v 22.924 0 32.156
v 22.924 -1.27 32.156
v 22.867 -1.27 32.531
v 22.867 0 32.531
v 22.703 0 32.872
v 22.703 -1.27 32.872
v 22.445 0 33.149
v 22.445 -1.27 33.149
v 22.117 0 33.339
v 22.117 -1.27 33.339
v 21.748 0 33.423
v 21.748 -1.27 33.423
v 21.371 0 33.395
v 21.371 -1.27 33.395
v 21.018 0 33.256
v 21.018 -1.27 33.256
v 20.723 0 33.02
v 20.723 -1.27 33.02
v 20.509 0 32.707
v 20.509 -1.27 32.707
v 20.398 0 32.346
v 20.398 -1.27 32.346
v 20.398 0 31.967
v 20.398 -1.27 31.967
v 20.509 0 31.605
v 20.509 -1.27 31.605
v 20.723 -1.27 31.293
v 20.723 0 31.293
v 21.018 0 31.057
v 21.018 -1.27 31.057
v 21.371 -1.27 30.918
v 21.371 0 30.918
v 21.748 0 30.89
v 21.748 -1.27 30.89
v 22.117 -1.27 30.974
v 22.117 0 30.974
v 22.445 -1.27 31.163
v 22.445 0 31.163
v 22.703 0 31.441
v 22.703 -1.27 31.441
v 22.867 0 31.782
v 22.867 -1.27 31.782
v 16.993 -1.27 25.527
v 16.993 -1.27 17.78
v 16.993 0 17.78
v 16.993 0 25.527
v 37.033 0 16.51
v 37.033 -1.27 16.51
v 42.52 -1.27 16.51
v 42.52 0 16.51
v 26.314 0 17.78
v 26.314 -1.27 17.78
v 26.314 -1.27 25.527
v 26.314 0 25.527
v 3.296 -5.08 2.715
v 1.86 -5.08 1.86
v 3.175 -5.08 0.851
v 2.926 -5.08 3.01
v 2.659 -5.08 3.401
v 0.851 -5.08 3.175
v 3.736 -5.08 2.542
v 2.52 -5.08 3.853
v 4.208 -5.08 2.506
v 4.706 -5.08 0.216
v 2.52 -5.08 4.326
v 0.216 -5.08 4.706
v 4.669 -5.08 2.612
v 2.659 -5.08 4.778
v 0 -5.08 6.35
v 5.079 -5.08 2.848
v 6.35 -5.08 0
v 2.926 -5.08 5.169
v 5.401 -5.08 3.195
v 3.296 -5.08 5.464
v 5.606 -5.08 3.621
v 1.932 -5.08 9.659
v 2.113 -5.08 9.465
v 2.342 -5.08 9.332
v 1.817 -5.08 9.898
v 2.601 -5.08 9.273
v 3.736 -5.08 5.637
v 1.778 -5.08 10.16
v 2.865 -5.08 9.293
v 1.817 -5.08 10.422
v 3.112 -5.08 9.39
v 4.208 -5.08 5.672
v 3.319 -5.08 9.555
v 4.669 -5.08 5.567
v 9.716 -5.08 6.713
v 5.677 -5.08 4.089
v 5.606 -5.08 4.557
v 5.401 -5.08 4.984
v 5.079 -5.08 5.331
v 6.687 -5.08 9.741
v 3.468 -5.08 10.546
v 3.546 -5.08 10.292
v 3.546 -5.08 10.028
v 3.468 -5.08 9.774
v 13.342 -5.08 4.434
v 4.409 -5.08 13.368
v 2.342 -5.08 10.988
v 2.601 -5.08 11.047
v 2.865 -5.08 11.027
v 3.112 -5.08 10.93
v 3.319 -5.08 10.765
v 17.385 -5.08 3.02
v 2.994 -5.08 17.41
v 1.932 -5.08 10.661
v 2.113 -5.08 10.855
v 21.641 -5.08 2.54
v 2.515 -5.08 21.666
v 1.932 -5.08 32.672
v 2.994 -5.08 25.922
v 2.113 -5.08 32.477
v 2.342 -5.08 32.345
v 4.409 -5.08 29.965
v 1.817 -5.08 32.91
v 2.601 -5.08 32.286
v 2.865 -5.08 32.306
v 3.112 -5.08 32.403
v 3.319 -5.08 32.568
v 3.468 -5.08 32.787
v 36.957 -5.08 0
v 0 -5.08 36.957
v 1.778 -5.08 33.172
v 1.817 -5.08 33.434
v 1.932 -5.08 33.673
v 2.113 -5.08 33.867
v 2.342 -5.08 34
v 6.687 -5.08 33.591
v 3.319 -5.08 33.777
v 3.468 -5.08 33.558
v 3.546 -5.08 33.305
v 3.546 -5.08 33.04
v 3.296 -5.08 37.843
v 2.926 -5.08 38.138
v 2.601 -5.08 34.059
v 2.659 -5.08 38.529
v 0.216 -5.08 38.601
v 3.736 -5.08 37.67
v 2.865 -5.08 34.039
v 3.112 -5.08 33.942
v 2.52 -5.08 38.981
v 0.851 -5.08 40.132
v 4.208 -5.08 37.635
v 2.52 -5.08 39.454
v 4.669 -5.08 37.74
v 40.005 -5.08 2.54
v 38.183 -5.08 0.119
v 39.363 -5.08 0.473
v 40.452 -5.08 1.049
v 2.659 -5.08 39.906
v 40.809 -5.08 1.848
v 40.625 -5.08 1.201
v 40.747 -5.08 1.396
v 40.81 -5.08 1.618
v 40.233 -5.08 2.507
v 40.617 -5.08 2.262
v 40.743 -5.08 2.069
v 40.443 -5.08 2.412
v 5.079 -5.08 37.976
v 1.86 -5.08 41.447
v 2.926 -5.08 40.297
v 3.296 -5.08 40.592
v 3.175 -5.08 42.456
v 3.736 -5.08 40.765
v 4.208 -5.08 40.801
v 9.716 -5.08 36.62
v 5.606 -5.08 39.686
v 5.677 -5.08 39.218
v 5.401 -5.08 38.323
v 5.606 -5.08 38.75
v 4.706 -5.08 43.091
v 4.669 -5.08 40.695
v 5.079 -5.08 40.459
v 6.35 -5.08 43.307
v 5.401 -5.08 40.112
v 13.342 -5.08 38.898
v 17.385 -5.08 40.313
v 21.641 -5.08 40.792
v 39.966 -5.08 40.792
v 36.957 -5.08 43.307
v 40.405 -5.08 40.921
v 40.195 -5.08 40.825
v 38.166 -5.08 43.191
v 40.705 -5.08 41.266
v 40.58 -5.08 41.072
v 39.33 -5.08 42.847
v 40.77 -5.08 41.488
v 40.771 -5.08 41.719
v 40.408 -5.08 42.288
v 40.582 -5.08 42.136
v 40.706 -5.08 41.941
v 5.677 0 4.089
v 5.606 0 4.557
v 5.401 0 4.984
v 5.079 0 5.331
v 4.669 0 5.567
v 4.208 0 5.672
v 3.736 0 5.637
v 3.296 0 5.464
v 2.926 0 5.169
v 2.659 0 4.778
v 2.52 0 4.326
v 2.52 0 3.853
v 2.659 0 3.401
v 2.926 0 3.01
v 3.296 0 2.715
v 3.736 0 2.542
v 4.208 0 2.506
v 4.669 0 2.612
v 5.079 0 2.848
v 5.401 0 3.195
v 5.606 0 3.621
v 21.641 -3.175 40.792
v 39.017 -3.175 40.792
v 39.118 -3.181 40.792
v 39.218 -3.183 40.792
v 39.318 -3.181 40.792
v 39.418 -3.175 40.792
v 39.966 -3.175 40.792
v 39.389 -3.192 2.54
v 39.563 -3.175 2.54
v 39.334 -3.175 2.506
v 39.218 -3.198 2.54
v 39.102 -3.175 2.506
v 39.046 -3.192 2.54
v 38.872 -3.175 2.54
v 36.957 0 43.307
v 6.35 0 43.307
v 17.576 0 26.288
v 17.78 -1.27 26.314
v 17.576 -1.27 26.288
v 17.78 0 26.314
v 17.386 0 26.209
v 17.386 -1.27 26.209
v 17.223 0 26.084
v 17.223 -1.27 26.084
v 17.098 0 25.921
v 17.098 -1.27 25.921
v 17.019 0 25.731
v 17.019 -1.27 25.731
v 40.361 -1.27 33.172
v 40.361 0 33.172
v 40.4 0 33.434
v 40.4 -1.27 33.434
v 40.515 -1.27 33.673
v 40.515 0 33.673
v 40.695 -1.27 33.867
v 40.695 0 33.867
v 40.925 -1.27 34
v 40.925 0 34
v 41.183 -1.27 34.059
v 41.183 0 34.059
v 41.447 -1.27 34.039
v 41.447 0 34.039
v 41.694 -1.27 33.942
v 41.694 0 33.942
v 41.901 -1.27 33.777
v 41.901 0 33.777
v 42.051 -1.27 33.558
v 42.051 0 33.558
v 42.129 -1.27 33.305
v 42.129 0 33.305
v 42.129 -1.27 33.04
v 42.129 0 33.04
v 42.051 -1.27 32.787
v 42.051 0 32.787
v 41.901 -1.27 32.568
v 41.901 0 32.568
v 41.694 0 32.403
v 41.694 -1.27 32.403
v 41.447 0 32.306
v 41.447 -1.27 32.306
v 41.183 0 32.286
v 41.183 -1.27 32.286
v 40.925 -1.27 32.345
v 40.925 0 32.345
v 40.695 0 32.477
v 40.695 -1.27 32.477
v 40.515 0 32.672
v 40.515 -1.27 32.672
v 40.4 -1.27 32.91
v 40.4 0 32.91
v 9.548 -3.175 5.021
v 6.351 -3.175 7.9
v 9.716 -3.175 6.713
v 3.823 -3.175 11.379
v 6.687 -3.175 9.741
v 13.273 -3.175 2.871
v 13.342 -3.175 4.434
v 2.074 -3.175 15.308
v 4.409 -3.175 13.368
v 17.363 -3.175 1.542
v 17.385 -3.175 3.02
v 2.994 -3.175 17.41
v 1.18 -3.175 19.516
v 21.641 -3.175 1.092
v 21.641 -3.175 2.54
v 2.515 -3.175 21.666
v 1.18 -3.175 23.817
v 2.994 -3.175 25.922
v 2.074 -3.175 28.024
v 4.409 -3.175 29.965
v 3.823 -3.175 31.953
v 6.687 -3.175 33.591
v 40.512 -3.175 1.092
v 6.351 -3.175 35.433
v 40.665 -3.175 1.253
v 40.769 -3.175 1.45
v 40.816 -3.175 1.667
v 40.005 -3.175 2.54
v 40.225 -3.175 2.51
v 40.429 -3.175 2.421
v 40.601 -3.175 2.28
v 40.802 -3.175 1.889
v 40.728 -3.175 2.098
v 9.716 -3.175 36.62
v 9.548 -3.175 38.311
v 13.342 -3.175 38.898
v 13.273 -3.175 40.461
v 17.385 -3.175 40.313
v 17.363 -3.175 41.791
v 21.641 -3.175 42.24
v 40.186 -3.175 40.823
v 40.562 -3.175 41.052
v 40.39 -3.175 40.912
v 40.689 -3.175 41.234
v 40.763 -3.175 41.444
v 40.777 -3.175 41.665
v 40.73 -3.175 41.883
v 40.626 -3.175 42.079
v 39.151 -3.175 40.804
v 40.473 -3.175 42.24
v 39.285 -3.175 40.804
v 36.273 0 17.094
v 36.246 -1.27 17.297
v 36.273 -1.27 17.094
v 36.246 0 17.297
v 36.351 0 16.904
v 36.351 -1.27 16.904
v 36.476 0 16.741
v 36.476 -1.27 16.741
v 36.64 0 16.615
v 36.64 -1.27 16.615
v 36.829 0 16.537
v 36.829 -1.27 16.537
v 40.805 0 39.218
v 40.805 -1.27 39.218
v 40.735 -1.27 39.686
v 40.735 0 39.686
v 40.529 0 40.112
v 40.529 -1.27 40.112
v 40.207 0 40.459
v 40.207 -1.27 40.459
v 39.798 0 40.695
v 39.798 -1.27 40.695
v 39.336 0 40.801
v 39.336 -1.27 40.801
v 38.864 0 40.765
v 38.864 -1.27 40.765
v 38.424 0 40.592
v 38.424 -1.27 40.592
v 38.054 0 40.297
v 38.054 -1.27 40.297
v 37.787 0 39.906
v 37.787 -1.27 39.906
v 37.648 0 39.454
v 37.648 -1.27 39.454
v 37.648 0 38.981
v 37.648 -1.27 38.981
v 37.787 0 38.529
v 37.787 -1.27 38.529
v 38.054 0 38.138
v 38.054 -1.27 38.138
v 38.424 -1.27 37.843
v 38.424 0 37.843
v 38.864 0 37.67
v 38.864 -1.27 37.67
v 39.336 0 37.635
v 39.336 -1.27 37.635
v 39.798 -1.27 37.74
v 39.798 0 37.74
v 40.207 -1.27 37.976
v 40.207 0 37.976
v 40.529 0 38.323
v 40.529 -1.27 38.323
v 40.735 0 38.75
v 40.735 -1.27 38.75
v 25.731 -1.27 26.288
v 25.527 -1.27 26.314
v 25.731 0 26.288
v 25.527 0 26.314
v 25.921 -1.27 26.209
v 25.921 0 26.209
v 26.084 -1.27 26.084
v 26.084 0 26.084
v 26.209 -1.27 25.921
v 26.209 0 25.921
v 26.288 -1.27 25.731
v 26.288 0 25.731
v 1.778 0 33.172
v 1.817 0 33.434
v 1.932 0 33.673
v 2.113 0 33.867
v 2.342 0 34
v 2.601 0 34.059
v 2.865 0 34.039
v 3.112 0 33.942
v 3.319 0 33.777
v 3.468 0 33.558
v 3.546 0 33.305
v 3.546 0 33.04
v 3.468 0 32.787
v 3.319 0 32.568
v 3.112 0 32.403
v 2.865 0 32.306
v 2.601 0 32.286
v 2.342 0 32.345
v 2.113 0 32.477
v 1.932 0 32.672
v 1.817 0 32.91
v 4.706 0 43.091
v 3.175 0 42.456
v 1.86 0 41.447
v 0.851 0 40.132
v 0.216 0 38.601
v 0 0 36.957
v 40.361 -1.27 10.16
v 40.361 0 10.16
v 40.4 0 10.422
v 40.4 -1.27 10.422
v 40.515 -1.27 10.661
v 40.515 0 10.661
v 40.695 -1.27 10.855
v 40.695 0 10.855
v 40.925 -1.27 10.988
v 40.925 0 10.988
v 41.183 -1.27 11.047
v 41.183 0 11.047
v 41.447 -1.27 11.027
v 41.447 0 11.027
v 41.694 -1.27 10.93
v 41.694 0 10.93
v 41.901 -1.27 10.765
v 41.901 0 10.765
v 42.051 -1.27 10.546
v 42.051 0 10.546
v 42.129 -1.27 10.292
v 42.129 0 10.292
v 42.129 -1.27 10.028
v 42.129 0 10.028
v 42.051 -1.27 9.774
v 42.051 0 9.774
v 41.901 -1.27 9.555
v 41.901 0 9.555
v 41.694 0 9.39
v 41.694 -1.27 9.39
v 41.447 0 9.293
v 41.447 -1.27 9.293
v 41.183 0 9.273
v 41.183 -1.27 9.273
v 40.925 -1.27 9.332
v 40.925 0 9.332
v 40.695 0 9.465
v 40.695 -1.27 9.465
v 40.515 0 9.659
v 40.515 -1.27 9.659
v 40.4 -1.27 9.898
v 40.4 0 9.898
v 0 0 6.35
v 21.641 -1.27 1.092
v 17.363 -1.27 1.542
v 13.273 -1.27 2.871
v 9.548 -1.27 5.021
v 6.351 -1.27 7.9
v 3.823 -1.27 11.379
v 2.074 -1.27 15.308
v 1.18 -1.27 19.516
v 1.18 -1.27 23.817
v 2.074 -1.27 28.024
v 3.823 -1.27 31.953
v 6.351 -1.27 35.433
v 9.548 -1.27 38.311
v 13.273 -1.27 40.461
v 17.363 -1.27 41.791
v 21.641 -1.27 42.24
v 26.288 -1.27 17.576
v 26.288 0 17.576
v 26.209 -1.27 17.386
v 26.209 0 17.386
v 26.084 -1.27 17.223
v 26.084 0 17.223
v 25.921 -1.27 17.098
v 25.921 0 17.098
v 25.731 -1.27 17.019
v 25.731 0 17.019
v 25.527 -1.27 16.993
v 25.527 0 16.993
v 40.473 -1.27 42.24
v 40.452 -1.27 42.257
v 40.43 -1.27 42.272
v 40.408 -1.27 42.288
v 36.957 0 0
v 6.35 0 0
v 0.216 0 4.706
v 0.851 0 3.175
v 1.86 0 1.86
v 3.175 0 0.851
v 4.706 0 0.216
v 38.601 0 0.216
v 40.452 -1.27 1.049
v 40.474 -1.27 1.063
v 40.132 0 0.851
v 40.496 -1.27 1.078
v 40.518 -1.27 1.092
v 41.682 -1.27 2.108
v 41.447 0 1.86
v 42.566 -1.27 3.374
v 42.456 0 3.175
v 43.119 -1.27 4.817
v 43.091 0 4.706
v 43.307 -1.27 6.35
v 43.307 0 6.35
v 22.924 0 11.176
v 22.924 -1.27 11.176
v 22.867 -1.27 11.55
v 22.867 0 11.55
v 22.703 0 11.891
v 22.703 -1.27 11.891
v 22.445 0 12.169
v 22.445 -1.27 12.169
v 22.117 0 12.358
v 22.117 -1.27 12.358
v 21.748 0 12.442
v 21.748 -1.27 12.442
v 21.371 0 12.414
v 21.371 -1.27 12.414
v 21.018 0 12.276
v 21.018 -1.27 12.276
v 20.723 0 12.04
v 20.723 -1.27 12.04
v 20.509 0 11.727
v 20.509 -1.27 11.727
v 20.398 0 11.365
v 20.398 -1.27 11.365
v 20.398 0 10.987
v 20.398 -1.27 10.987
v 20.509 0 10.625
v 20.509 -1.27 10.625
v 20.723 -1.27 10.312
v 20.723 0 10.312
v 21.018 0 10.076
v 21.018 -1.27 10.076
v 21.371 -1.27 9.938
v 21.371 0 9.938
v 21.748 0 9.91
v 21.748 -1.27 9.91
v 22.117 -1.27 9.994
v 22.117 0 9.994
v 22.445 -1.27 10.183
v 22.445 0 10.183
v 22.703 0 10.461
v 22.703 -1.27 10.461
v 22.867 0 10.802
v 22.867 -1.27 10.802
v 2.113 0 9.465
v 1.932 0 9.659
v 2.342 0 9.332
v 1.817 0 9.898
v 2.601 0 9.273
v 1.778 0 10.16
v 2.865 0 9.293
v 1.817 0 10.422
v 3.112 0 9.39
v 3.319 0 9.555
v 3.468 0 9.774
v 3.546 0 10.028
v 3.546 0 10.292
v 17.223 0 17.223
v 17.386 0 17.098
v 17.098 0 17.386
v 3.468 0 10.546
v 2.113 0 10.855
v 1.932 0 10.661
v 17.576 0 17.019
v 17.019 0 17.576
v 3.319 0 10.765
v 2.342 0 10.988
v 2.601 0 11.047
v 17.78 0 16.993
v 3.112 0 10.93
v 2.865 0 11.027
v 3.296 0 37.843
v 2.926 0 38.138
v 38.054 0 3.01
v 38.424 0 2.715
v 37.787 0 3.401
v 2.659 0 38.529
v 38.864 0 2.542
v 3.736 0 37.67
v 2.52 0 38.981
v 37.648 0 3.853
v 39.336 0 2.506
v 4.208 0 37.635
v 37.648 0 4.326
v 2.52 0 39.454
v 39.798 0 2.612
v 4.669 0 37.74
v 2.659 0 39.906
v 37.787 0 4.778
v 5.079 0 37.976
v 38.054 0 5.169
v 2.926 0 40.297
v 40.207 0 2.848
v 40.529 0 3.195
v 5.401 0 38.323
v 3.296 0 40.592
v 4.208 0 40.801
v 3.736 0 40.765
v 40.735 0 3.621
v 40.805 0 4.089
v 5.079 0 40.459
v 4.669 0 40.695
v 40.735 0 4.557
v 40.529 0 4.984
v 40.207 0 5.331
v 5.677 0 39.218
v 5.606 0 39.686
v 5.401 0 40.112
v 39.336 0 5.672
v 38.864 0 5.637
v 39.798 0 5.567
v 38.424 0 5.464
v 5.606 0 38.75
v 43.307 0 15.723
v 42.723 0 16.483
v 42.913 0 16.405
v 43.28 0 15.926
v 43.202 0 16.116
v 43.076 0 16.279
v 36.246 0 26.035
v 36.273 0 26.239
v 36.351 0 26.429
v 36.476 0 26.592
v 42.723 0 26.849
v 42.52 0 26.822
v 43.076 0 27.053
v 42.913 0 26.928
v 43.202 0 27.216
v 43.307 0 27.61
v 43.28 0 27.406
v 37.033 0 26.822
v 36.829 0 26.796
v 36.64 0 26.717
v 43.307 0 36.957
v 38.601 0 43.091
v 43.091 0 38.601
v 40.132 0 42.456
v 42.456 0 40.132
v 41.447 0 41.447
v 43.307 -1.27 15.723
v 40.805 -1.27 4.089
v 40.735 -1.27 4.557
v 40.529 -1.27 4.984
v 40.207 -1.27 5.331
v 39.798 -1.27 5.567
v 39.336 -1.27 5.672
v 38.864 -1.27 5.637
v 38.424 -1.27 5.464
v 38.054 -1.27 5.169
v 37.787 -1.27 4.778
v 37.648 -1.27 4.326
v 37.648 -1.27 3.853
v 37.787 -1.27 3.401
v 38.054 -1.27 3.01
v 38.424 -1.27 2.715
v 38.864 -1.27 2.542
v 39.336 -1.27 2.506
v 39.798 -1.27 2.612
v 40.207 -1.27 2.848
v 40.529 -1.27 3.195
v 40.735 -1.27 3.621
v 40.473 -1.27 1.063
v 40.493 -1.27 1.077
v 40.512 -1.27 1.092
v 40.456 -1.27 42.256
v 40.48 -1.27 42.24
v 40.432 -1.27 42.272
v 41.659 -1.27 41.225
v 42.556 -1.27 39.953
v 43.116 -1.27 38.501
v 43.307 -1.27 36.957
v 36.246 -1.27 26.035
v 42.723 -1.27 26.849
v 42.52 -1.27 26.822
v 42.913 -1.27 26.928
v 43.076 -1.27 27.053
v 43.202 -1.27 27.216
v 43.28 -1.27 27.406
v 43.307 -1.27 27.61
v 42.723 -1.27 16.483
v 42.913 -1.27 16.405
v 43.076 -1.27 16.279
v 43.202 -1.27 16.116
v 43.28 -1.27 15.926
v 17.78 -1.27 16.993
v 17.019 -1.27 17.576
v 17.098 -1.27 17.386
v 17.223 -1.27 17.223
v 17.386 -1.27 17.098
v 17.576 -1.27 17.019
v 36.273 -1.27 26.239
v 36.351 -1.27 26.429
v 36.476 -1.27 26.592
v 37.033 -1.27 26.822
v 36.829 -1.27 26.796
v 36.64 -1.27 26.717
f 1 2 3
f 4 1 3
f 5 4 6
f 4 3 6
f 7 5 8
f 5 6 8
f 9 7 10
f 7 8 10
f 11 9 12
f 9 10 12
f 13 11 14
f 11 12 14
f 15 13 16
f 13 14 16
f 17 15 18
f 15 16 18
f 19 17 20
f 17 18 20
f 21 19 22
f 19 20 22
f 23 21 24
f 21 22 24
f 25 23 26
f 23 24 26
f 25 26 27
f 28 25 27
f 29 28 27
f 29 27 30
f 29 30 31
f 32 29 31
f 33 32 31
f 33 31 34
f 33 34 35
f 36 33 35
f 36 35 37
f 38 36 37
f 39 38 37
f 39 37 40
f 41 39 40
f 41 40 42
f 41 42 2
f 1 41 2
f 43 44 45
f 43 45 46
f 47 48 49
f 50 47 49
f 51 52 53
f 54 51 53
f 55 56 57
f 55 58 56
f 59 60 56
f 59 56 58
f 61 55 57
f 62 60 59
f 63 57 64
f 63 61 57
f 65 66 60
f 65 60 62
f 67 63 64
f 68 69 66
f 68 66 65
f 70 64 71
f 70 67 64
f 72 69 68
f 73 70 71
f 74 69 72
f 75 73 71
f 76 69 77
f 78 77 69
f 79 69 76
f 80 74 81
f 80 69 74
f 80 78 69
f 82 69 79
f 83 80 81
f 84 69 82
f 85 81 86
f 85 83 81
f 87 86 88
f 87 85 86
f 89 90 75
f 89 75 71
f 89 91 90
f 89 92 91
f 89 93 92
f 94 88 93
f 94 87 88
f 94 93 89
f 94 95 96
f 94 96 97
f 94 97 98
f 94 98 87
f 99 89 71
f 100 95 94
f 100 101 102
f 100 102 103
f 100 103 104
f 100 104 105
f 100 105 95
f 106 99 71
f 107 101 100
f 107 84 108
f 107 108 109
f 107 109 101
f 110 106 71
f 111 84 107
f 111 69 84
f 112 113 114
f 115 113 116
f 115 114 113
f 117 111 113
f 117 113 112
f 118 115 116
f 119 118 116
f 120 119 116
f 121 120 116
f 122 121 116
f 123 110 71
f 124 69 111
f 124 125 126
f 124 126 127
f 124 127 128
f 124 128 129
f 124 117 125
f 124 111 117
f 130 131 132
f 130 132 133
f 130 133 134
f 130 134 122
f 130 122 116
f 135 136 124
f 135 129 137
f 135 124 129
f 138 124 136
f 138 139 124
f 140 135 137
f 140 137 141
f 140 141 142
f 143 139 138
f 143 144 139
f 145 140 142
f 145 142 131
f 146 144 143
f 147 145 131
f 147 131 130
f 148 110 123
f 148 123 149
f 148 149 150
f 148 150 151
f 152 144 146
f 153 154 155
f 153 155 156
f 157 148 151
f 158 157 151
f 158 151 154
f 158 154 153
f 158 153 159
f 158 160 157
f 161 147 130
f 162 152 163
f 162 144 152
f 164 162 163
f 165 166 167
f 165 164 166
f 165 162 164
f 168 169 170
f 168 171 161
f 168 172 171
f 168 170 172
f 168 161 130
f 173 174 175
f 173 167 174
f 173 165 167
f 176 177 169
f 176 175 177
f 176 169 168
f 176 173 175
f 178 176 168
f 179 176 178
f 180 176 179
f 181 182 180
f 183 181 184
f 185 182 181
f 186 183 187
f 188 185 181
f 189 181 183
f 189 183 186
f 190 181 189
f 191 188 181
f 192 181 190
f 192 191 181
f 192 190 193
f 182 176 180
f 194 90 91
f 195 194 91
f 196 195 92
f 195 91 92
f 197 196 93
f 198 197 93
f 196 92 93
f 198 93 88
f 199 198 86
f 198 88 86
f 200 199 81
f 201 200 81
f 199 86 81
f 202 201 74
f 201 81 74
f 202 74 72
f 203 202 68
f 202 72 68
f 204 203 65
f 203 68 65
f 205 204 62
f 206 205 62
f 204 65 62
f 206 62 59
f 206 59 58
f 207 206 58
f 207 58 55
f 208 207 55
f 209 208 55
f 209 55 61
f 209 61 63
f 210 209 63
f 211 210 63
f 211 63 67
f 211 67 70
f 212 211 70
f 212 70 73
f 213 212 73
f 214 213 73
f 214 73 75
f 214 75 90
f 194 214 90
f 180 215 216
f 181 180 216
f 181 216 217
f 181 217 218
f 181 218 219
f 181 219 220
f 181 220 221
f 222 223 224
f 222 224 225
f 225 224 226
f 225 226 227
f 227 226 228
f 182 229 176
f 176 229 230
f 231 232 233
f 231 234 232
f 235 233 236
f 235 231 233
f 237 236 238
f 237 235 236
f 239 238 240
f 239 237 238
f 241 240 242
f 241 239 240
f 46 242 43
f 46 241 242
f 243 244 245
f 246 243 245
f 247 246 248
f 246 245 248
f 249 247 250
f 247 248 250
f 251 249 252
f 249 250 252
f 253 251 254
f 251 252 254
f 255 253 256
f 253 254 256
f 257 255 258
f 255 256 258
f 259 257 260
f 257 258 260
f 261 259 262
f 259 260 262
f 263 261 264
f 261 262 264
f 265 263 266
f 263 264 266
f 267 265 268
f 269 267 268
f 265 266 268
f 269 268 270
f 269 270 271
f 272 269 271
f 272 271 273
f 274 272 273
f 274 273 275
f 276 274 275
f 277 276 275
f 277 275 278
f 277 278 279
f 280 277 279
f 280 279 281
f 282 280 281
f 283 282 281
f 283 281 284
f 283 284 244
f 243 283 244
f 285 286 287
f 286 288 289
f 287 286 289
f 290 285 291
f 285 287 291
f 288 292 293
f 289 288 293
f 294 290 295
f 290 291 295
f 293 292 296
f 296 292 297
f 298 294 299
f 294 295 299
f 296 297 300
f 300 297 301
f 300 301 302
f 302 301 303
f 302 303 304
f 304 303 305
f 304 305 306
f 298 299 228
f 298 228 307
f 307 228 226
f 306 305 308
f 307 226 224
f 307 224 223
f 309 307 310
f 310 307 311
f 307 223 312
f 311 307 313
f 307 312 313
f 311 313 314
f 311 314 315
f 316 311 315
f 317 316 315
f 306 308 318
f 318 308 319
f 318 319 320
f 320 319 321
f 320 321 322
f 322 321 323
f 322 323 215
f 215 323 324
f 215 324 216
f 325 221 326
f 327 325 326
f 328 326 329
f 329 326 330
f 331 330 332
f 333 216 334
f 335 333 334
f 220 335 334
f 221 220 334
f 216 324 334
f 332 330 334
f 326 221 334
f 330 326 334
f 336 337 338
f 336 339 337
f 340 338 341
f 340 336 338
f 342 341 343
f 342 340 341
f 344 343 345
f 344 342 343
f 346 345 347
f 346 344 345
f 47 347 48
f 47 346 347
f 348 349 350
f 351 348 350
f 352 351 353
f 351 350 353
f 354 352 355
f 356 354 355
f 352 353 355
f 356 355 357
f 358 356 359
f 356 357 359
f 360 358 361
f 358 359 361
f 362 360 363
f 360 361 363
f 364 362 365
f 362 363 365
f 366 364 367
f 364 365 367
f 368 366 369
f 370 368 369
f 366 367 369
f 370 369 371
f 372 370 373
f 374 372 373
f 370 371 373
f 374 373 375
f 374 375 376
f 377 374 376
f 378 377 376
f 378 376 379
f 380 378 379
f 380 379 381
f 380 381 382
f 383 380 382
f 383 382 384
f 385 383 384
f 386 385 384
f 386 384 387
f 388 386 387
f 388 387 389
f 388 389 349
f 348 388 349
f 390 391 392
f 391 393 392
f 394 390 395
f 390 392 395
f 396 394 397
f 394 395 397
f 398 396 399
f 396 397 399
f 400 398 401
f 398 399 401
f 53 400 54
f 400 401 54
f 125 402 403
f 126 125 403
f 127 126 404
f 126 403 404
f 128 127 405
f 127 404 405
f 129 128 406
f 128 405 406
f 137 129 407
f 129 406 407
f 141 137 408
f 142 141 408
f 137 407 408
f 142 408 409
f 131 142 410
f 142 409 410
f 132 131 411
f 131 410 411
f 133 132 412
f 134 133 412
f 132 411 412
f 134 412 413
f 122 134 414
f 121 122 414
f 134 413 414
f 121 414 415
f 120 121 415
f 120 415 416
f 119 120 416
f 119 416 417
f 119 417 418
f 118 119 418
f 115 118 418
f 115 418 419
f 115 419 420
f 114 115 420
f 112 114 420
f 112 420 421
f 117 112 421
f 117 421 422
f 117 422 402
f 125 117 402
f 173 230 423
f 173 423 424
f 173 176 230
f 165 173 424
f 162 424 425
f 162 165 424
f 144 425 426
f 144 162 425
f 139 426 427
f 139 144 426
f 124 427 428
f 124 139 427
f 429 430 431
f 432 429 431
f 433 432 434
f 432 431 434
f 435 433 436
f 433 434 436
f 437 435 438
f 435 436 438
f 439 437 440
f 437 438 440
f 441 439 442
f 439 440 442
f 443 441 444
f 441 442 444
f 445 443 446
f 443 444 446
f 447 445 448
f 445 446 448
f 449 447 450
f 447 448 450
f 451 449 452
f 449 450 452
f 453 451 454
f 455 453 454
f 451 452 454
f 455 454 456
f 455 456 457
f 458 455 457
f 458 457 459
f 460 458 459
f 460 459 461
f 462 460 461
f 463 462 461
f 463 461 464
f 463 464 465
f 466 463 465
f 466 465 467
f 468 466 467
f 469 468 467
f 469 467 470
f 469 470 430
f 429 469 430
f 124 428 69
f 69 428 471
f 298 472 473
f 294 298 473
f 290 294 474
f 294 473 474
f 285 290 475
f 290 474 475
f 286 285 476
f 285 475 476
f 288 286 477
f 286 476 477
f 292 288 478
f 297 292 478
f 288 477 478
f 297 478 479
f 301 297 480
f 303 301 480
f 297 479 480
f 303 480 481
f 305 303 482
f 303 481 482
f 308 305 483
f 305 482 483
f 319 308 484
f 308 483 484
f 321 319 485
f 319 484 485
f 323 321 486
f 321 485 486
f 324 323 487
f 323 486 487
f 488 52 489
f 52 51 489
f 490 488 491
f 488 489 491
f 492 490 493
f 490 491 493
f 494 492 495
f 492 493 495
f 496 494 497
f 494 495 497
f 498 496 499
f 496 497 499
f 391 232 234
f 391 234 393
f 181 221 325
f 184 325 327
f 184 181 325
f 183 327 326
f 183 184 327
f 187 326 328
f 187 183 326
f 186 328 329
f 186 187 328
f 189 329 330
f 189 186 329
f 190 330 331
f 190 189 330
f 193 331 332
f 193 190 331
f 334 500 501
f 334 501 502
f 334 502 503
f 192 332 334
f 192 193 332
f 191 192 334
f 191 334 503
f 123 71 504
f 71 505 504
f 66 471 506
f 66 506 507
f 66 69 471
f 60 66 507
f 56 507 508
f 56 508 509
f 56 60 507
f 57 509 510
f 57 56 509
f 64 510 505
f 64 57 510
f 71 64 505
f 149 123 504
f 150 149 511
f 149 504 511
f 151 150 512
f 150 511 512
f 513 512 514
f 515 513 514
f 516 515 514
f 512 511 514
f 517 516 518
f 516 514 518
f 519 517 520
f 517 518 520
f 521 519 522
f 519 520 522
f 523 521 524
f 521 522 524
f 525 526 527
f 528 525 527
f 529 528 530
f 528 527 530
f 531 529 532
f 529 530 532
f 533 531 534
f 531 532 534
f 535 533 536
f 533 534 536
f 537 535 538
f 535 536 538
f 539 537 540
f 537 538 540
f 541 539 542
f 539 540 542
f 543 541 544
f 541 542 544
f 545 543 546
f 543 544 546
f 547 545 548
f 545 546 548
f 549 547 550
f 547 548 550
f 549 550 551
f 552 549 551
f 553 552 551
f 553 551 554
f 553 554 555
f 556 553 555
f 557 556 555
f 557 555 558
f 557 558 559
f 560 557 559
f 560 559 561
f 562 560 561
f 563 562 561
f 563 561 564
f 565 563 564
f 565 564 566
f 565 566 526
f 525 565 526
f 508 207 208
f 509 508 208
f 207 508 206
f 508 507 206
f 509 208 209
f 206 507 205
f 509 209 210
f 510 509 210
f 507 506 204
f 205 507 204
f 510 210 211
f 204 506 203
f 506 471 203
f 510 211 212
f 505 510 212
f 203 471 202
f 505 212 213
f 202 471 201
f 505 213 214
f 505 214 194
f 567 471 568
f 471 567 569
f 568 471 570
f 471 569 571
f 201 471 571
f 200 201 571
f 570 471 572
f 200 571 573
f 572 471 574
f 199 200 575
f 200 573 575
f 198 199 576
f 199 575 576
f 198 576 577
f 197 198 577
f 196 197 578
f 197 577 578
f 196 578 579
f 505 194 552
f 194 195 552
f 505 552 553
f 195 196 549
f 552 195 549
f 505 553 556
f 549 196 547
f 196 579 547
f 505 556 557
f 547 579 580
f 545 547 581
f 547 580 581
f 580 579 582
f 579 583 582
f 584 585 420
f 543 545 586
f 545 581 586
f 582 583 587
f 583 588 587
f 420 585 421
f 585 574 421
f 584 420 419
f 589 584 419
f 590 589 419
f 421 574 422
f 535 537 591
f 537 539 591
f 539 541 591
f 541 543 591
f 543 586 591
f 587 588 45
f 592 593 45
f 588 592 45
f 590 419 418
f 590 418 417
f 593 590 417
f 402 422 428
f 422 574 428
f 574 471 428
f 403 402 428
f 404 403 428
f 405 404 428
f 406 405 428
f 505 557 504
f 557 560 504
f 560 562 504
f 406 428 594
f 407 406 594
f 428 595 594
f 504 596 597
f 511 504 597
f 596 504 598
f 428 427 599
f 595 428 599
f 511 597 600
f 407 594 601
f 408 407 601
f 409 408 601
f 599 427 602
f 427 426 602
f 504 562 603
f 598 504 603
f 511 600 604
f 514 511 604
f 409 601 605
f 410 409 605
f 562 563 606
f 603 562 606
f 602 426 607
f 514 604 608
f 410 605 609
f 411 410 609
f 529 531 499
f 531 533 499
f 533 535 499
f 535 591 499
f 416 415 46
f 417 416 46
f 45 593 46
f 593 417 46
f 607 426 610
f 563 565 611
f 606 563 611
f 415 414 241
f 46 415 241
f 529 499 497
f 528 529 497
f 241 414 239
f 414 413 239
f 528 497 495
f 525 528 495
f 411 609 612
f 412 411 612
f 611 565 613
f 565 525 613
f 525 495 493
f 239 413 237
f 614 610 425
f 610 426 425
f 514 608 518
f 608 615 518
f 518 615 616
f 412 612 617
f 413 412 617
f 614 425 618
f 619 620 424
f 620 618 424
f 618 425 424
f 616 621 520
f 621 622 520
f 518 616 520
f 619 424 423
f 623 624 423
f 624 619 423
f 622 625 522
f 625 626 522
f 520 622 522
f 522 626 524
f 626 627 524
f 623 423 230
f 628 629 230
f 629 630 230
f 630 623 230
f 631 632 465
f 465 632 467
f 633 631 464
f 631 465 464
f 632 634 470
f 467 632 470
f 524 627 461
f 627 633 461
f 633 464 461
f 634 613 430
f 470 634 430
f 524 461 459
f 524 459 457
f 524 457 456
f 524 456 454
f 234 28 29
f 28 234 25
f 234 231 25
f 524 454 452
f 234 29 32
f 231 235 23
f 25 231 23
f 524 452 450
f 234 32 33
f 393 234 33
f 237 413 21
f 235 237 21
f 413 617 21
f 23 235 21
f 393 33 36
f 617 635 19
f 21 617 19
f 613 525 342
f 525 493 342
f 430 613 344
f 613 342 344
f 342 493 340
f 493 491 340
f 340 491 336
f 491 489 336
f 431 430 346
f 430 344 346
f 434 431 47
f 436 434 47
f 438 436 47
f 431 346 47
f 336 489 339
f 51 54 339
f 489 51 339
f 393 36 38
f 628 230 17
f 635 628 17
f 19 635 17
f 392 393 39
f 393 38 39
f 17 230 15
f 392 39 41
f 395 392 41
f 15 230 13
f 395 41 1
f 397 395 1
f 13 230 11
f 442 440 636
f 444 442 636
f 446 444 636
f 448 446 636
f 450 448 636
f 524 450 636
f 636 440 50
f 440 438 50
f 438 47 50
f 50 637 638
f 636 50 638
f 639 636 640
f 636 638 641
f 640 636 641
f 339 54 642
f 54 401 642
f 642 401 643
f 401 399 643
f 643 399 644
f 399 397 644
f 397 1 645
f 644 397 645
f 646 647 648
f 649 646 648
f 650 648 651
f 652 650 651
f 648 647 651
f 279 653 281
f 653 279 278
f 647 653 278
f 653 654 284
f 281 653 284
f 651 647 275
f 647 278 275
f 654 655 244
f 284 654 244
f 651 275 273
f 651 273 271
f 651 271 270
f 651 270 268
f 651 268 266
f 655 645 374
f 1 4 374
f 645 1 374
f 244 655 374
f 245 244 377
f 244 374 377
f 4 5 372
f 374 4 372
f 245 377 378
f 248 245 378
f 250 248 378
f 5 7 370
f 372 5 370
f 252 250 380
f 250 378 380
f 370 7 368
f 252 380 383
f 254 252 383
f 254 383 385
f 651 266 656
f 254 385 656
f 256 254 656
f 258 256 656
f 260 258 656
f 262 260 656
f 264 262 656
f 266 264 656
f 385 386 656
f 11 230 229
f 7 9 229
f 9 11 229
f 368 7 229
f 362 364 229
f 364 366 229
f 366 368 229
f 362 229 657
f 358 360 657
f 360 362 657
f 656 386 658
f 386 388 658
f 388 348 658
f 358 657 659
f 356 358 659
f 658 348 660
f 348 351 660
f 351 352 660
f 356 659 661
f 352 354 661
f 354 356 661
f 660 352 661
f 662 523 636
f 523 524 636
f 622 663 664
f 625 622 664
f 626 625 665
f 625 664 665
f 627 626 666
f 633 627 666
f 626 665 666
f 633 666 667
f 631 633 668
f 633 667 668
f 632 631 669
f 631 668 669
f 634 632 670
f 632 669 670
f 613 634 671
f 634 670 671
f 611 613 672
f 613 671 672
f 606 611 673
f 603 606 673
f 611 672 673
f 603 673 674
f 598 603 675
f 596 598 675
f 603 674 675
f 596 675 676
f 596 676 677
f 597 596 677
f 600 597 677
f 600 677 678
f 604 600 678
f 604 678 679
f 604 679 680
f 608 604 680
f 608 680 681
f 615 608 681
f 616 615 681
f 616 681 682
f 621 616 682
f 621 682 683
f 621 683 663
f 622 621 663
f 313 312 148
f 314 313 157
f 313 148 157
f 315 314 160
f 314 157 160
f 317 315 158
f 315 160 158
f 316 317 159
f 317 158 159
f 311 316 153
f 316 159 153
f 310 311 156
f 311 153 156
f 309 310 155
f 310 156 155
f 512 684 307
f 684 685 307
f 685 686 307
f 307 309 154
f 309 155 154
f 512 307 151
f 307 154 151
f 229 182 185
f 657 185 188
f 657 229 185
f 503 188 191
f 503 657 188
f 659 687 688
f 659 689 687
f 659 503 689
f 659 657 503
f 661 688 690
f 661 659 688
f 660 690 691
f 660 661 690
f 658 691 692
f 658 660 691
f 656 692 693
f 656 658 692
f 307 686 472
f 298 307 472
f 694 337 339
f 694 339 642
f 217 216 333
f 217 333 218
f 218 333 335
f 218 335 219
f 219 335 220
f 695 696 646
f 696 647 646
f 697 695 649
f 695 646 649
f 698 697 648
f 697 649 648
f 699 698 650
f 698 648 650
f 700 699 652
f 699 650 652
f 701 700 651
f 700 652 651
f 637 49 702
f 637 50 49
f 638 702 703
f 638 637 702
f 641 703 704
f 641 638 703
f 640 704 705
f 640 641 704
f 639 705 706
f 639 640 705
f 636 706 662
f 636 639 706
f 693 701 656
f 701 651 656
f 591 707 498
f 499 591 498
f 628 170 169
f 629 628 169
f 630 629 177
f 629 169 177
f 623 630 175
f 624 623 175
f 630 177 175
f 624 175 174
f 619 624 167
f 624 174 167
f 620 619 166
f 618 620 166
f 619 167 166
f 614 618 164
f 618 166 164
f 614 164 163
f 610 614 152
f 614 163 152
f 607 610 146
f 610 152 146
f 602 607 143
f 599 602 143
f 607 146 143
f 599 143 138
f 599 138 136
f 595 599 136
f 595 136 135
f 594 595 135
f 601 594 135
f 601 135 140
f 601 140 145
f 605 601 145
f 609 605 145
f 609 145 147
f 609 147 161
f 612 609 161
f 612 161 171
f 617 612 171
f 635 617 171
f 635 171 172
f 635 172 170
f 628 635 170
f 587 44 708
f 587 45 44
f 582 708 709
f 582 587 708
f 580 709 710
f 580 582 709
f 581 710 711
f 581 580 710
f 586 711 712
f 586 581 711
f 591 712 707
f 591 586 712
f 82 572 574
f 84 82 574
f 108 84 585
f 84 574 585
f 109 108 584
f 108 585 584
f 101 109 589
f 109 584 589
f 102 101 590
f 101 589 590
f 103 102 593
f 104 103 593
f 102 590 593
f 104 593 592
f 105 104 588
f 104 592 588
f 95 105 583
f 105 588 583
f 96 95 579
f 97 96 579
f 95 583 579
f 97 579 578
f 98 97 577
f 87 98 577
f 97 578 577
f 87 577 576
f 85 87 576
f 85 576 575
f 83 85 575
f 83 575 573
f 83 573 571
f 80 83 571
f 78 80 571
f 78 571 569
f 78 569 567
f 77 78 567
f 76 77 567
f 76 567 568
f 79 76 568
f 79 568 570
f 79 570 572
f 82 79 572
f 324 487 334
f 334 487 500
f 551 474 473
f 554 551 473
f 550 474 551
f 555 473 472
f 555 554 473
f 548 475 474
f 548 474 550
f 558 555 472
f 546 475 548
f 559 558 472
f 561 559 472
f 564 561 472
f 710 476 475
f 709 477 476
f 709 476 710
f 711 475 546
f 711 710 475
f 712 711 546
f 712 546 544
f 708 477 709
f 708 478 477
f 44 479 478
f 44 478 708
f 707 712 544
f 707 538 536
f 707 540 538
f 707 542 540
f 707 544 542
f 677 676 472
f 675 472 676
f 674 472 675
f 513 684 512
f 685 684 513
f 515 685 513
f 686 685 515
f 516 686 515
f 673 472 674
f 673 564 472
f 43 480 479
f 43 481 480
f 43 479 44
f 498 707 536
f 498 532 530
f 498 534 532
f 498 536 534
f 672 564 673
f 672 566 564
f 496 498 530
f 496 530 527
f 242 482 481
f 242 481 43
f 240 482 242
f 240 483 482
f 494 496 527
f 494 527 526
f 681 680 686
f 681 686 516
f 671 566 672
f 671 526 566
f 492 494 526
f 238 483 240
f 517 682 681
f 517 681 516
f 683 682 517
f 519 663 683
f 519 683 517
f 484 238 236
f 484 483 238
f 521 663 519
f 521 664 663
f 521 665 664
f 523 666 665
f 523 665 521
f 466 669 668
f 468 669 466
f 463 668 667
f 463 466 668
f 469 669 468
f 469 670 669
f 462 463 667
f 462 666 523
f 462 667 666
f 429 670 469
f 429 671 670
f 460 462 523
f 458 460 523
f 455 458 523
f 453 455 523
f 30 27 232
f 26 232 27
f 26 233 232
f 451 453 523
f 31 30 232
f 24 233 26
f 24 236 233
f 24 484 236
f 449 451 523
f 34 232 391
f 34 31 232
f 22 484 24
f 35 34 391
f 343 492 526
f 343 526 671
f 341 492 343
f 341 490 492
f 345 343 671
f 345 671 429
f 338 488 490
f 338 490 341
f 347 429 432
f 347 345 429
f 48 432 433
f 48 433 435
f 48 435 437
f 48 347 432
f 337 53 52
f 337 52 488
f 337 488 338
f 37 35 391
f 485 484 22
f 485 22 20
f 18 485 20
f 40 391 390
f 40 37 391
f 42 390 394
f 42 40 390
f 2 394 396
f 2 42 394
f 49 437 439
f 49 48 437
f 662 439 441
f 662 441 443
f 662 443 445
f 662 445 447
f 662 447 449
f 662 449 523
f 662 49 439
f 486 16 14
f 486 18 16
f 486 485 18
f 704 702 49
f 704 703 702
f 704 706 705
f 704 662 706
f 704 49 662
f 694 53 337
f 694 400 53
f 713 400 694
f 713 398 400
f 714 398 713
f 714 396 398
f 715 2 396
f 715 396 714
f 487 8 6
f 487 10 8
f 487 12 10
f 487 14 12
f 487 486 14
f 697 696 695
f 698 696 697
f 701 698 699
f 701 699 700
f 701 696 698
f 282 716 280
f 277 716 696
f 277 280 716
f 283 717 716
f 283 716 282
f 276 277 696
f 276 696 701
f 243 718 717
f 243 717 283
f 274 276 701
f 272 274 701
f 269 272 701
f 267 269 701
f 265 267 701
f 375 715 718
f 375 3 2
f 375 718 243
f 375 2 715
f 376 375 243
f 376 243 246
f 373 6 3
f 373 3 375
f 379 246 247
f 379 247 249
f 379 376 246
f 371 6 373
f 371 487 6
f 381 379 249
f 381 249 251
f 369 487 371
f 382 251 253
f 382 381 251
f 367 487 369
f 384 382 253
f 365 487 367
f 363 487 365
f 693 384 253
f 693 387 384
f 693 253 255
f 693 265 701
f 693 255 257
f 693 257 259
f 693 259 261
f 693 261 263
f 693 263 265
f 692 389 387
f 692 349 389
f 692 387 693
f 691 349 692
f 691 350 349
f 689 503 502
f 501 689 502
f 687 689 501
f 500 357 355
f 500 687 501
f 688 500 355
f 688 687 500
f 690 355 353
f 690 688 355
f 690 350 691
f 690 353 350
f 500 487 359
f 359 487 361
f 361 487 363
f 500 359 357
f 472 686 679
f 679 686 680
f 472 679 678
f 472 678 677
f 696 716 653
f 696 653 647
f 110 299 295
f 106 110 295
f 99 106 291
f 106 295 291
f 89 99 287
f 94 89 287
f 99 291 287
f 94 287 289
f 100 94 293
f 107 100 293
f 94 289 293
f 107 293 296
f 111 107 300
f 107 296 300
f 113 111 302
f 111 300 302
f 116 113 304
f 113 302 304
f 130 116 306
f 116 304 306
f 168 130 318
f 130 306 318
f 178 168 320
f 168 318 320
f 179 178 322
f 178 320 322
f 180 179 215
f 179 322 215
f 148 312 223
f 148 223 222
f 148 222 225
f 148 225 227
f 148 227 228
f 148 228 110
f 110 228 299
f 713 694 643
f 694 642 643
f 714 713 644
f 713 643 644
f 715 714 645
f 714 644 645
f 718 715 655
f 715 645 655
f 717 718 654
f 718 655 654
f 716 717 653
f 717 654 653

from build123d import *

# Parameters (mm, degrees)
F0_W         = 43.307
F0_H         = 43.307
F1_DEPTH     = 1.27
F3_DEPTH     = 3.175
F5_DEPTH     = 1.905
F6_R         = 0.889
F7_DEPTH     = 5.081
F8_W         = 9.3218
F8_H         = 9.3218
F8_W_2       = 7.0612
F8_H_2       = 10.3124
F10_DEPTH    = 1.27
F11_D        = 3.175
F14_D        = 2.54
F15_R        = 6.35
F16_T4_DEPTH = 12.7851645967
F16_T9_DEPTH = 12.8907938144
F17_R        = 0.7874
F18_D        = 3.175
F18_DEPTH    = 3.175
F18_TIP      = 0.9538662327


# Not quite as in the source:
# - a fillet or chamfer that OpenCascade refuses, or shapes differently, is made with other operations: its cross-section is extruded or revolved along the edge and cut away or added


with BuildPart() as f1:
    # F0 (on Front) → F1 (new body)
    with BuildSketch(Plane.XZ):
        with Locations((21.6535, 21.6535)):
            Rectangle(F0_W, F0_H)
    extrude(amount=F1_DEPTH)

    # F2 (on Front) → F3 (join)
    with BuildSketch(Plane.XZ):
        with BuildLine():
            Line((43.307, 43.307), (0, 43.307))
            Line((0, 43.307), (0, 0))
            Line((0, 0), (43.307, 0))
            Line((43.307, 0), (43.307, 1.0922))
            Line((43.307, 1.0922), (21.6408, 1.0922))
            ThreePointArc((21.6408, 1.0922), (1.0668, 21.6662), (21.6408, 42.2402))
            Line((21.6408, 42.2402), (43.307, 42.2402))
            Line((43.307, 42.2402), (43.307, 43.307))
        make_face()
    extrude(amount=F3_DEPTH)

    # F4 (on face) → F5 (join)
    with BuildSketch(Plane.XZ.offset(3.175)):
        with BuildLine():
            Line((43.307, 43.307), (0, 43.307))
            Line((0, 43.307), (0, 0))
            Line((0, 0), (43.307, 0))
            Line((43.307, 0), (43.307, 2.54))
            Line((43.307, 2.54), (21.6408, 2.54))
            ThreePointArc((21.6408, 2.54), (2.5146, 21.6662), (21.6408, 40.7924))
            Line((21.6408, 40.7924), (43.307, 40.7924))
            Line((43.307, 40.7924), (43.307, 43.307))
        make_face()
    extrude(amount=F5_DEPTH)

    # F6 (on face) → F7 (cut, through all)
    with BuildSketch(Plane(origin=(0, 0, 0), x_dir=(-1, 0, 0), z_dir=(0, 1, 0))):
        with Locations((-41.2496, 33.1724)):
            Circle(F6_R)
        with Locations((-2.667, 33.1724)):
            Circle(F6_R)
        with Locations((-41.2496, 10.16)):
            Circle(F6_R)
        with Locations((-2.667, 10.16)):
            Circle(F6_R)
    extrude(amount=-F7_DEPTH, mode=Mode.SUBTRACT)

    # F8 (on face) → F10 (cut, through all)
    with BuildSketch(Plane.XZ.offset(1.27)):
        with Locations((21.6535, 21.6535)):
            Rectangle(F8_W, F8_H)
        with Locations((39.7764, 21.6662)):
            Rectangle(F8_W_2, F8_H_2)
    extrude(amount=-F10_DEPTH, mode=Mode.SUBTRACT)

    # F11 (through all)
    with Locations(Plane(origin=(0, 0, 0), x_dir=(-1, 0, 0), z_dir=(0, 1, 0))):
        with Locations((-4.0894, 39.2176), (-4.0894, 4.0894)):
            Hole(F11_D / 2)

    # F14 (through all)
    with Locations(Plane(origin=(0, 0, 0), x_dir=(-1, 0, 0), z_dir=(0, 1, 0))):
        with Locations((-21.6535, 32.1564), (-21.6535, 11.176)):
            Hole(F14_D / 2)

    # F15
    f15_edges = [f1.edges().sort_by_distance(p)[0] for p in [
        (0, -2.54, 43.307),
        (43.307, -2.54, 43.307),
        (43.307, -2.54, 0),
        (0, -2.54, 0),
    ]]
    fillet(f15_edges, radius=F15_R)

    # F16: fillet of radius 0.8128 on 2 edges, made by hand


with BuildPart() as f16_tool2:
    # F16_s3 → F16_t4 (new body)
    with BuildSketch(Plane.XZ.offset(10.5200822984)):
        with BuildLine():
            ThreePointArc((40.005, 2.54), (40.7835212046, 1.9607563614), (40.452412844, 1.0486238532))
            ThreePointArc((40.452412844, 1.0486238532), (41.3090658387, 1.7259300464), (42.037, 2.54))
            Line((42.037, 2.54), (40.005, 2.54))
        make_face()
    extrude(amount=-F16_T4_DEPTH)

    split(bisect_by=Plane.XZ.offset(1.27), keep=Keep.TOP)


with BuildPart() as f1_1:
    add(f1.part)

    # F16_t1: cut F16_tool2
    add(f16_tool2.part, mode=Mode.SUBTRACT)


with BuildPart() as f16_tool7:
    # F16_s8 → F16_t9 (new body)
    with BuildSketch(Plane.XZ.offset(10.5728969072)):
        with BuildLine():
            ThreePointArc((39.9661228955, 40.7924), (40.7456166441, 41.374910322), (40.4078290086, 42.2875045872))
            ThreePointArc((40.4078290086, 42.2875045872), (41.2779959557, 41.6101165847), (42.0178504068, 40.7924))
            Line((42.0178504068, 40.7924), (39.9661228955, 40.7924))
        make_face()
    extrude(amount=-F16_T9_DEPTH)

    split(bisect_by=Plane.XZ.offset(1.27), keep=Keep.TOP)


with BuildPart() as f1_2:
    add(f1_1.part)

    # F16_t6: cut F16_tool7
    add(f16_tool7.part, mode=Mode.SUBTRACT)

    # F17
    f17_edges = [f1_2.edges().sort_by_distance(p)[0] for p in [
        (43.307, -0.635, 26.8224),
        (36.2458, -0.635, 26.8224),
        (16.9926, -0.635, 26.3144),
        (16.9926, -0.635, 16.9926),
        (26.3144, -0.635, 16.9926),
        (43.307, -0.635, 16.51),
        (36.2458, -0.635, 16.51),
        (26.3144, -0.635, 26.3144),
    ]]
    fillet(f17_edges, radius=F17_R)

    # F18
    with Locations(Plane(origin=(0, 0, 0), x_dir=(-1, 0, 0), z_dir=(0, 1, 0))):
        with Locations((-39.2176, 4.0894), (-39.2176, 39.2176)):
            Hole(F18_D / 2, depth=F18_DEPTH)
            with Locations((0, 0, -(F18_DEPTH + F18_TIP / 2))):  # 118° drill point
                Cone(0, F18_D / 2, F18_TIP, mode=Mode.SUBTRACT)


solid = f1_2.part
